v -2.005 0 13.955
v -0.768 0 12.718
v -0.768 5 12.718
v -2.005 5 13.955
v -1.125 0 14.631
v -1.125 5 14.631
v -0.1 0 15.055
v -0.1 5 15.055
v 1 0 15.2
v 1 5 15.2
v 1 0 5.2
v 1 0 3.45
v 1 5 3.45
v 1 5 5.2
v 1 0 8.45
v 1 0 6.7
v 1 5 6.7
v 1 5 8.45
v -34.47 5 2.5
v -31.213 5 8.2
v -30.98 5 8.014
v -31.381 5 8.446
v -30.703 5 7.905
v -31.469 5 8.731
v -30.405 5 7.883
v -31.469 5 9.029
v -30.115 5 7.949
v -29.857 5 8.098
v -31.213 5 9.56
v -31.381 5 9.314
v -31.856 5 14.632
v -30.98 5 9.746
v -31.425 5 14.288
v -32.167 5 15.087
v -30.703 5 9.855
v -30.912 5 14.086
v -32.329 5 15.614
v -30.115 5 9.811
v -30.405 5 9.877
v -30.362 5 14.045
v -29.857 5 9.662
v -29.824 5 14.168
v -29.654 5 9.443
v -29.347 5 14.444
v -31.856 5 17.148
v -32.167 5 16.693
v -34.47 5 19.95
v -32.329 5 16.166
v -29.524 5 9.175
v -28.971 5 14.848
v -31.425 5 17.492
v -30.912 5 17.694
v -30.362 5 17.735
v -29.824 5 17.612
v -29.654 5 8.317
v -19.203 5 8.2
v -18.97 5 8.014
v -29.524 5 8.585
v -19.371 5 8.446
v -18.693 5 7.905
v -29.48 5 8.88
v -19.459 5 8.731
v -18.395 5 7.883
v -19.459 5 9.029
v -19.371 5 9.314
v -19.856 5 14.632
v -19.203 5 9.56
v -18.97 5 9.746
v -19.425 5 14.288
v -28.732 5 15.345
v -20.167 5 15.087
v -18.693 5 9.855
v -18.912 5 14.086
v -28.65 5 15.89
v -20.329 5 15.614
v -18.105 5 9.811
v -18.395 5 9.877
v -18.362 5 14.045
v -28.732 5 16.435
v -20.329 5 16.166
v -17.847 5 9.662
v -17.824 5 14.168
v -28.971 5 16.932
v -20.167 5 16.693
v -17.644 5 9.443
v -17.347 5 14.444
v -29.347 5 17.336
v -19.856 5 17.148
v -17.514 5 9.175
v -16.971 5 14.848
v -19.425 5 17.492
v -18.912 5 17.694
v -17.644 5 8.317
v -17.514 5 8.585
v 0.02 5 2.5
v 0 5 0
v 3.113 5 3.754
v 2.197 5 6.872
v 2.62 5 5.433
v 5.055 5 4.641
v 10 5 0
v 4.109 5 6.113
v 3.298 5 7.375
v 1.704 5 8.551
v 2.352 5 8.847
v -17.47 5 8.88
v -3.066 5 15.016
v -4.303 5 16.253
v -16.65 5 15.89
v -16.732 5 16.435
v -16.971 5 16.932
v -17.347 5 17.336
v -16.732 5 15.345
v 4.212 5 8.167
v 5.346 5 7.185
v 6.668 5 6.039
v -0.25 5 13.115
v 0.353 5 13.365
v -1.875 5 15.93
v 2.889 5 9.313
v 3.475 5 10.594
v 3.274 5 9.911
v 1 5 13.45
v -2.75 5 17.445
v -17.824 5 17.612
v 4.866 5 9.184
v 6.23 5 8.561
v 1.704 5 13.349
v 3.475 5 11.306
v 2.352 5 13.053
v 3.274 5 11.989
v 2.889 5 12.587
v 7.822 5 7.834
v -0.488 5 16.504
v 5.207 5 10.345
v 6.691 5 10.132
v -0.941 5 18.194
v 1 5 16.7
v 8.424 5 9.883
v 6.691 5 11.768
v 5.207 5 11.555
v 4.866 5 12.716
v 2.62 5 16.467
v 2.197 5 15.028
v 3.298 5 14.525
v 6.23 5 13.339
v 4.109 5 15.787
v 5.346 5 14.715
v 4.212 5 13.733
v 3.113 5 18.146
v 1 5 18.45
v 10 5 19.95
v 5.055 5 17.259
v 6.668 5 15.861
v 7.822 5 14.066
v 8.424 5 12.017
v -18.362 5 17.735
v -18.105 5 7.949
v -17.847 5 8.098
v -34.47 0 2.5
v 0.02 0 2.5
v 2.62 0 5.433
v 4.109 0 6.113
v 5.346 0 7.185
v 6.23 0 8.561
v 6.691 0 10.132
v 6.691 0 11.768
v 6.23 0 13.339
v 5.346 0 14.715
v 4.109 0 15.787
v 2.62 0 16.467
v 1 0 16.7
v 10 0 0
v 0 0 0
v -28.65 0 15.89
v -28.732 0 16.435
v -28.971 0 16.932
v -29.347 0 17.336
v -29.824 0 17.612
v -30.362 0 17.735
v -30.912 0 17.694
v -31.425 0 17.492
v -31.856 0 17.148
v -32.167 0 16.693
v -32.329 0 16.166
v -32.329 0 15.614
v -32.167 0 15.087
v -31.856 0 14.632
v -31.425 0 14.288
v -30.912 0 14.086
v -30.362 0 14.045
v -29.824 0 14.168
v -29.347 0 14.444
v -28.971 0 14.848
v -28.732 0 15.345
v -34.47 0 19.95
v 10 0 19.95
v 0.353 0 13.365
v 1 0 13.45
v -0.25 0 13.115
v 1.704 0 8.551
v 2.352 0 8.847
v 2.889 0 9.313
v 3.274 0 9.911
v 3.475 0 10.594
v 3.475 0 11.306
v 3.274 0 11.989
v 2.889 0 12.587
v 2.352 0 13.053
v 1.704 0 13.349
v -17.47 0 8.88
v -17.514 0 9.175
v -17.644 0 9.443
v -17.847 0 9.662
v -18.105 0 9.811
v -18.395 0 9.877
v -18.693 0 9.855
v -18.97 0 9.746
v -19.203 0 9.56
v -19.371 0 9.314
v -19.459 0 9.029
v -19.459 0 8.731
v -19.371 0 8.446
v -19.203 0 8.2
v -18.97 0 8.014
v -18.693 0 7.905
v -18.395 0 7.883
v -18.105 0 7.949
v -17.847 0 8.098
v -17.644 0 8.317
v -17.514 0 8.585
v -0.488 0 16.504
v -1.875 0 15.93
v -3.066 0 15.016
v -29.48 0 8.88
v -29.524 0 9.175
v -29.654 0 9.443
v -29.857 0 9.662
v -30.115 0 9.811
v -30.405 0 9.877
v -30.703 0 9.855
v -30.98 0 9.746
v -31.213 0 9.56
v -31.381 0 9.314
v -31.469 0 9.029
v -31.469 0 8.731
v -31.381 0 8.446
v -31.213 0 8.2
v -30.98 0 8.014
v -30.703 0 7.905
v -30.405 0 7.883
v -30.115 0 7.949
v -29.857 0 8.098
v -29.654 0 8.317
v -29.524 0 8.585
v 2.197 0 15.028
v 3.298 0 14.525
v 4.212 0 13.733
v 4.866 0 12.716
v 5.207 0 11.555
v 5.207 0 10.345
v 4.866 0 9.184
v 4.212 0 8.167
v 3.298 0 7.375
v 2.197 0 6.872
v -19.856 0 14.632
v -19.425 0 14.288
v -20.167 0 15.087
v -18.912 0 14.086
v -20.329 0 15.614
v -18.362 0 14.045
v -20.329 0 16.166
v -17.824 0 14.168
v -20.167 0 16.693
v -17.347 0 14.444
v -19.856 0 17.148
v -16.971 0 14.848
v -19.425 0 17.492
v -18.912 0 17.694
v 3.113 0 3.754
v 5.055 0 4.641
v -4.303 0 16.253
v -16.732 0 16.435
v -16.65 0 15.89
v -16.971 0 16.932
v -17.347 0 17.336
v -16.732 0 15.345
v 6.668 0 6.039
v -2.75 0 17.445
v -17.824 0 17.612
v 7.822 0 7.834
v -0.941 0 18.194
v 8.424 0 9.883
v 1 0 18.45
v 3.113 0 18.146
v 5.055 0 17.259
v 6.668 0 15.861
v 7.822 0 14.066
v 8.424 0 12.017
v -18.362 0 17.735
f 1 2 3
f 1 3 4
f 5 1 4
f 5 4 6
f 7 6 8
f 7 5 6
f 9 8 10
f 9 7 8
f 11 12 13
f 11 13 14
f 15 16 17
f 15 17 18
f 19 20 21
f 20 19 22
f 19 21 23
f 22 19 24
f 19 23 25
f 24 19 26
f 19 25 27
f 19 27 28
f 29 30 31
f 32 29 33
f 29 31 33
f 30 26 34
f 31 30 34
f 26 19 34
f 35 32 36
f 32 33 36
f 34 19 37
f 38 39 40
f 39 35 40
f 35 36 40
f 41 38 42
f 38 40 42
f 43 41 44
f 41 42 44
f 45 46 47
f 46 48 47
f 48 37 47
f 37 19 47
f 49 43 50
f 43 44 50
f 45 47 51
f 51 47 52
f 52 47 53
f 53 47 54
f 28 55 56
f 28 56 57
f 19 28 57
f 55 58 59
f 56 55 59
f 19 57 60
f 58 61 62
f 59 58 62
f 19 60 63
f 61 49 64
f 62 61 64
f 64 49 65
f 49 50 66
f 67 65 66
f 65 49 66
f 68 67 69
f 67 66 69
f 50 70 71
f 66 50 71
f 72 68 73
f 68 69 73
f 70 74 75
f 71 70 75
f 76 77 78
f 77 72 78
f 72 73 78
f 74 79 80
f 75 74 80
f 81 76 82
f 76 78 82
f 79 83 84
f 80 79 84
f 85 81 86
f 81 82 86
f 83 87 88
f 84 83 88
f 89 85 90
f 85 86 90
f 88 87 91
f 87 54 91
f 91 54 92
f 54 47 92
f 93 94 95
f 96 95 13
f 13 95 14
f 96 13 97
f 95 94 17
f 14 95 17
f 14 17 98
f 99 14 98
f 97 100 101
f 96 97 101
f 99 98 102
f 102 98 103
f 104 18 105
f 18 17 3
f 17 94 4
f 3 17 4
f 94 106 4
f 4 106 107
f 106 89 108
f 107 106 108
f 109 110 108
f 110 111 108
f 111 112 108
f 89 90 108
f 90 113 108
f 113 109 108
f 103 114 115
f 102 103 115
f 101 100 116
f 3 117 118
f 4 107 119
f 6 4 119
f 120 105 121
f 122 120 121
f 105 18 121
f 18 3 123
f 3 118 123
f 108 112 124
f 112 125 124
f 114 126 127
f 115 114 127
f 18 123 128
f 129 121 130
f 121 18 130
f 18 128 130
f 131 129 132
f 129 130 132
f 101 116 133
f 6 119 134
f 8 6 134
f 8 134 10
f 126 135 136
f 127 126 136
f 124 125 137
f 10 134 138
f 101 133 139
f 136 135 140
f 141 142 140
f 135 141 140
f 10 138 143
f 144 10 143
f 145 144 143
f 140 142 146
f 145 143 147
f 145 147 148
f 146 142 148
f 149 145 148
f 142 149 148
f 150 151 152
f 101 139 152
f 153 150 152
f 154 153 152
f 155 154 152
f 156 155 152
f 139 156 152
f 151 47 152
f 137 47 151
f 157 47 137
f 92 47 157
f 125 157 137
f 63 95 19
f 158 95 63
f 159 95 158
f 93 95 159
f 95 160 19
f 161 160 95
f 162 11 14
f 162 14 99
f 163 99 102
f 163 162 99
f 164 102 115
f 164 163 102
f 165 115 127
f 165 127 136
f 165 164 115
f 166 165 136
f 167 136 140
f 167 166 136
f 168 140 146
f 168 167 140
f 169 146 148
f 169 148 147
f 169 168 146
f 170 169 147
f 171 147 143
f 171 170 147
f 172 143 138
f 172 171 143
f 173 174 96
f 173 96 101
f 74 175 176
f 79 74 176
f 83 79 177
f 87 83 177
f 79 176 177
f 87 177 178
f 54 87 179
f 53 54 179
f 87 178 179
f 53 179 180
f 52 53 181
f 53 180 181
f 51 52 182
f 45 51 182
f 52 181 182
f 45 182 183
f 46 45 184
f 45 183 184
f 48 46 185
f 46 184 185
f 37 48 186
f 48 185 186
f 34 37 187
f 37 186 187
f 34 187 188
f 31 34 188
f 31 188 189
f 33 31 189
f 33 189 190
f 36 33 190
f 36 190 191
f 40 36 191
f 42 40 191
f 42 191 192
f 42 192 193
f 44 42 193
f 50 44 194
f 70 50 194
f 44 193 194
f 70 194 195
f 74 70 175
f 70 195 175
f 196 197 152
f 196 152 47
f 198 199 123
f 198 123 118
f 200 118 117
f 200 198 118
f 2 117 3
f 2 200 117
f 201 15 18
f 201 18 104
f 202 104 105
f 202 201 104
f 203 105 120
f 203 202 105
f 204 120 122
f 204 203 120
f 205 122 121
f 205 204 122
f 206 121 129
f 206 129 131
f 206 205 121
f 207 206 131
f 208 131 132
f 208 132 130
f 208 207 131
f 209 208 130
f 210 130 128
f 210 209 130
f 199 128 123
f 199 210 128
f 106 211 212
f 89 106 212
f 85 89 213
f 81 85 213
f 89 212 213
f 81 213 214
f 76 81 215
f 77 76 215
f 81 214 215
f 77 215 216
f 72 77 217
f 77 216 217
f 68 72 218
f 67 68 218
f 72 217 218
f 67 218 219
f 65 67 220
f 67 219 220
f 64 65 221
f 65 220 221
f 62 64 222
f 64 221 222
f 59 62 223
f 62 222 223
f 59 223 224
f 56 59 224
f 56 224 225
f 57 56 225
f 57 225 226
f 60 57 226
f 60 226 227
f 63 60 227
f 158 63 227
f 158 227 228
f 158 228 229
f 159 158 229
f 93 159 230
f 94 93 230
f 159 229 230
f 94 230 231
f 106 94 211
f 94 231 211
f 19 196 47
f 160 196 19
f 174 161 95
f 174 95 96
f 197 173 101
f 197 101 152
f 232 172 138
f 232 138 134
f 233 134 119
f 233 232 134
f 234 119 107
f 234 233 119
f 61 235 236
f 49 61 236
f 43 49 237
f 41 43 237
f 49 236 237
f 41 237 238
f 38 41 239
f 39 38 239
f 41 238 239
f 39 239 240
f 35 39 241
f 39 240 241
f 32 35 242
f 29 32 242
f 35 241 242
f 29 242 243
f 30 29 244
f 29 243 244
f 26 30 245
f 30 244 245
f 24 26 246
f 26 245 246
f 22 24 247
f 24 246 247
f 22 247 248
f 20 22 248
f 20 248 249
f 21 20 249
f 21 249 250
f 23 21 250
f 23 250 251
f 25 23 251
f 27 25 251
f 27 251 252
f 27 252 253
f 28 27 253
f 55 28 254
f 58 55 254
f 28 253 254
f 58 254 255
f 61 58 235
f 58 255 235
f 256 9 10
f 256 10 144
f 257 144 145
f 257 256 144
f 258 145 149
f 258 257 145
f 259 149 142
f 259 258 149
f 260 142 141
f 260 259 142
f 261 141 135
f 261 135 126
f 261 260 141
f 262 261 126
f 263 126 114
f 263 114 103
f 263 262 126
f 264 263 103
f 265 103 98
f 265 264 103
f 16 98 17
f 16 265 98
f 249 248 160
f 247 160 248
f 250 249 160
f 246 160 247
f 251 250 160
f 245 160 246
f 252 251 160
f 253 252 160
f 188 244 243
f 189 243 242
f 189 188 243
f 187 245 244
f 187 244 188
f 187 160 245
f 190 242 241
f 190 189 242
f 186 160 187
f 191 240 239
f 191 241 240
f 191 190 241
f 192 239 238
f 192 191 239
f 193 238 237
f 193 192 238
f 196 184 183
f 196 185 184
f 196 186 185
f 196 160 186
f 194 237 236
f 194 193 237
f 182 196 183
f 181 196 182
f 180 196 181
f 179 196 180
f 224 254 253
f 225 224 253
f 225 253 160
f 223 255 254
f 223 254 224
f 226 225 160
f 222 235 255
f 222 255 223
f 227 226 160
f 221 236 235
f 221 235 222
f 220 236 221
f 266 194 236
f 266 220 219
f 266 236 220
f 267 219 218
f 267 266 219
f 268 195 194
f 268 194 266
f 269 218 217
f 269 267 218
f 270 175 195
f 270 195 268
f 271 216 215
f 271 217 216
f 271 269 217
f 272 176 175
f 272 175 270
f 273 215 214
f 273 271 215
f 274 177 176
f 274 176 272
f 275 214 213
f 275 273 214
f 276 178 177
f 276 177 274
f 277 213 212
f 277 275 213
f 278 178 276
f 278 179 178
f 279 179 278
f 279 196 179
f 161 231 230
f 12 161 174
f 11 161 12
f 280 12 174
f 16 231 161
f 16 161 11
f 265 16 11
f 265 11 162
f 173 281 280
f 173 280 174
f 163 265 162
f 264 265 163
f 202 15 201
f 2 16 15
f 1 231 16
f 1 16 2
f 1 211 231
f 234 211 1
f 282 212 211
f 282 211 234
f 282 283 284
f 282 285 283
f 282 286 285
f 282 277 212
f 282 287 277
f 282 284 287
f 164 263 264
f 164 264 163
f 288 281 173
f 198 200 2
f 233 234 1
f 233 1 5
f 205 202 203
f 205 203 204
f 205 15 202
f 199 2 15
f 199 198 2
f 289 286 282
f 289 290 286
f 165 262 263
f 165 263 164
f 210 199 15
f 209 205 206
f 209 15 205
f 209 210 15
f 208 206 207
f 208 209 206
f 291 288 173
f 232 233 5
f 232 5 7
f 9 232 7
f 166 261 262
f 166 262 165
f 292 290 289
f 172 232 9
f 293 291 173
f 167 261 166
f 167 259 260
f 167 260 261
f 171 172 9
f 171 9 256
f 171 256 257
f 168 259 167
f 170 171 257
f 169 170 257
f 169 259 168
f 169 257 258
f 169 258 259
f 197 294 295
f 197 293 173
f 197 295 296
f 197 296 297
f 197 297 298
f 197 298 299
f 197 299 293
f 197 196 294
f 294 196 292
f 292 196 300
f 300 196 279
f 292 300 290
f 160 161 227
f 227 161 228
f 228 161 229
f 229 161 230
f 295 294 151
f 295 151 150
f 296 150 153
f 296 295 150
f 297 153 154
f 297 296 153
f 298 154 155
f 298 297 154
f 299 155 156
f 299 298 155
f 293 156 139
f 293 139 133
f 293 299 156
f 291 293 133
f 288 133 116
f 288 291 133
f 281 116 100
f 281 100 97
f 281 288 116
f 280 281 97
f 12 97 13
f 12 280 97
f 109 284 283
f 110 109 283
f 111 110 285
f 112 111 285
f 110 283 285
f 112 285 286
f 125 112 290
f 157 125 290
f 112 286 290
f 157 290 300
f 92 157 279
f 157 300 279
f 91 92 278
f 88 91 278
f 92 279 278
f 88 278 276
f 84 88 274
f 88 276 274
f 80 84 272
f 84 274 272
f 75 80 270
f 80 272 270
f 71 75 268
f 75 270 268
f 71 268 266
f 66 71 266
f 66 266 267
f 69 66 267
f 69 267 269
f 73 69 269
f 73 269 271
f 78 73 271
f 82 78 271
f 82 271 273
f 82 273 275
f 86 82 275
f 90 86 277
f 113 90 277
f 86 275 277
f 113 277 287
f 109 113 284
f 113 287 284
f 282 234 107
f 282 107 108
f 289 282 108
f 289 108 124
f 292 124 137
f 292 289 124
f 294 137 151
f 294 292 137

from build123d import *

# Parameters (mm, degrees)
F0_R     = 1
F0_R_2   = 1.85
F1_DEPTH = 5


with BuildPart() as f1:
    # F0 (on Front) → F1 (new body)
    with BuildSketch(Plane.XZ):
        Polygon((10, 0), (10, 19.95), (1, 19.95), (-34.47, 19.95), (-34.47, 2.5), (-30.48, 2.5), (0.02, 2.5), (0, 0), align=None)
        with Locations((-30.48, 8.88)):
            Circle(F0_R, mode=Mode.SUBTRACT)
        with Locations((-18.47, 8.88)):
            Circle(F0_R, mode=Mode.SUBTRACT)
        with Locations((-30.5, 15.89)):
            Circle(F0_R_2, mode=Mode.SUBTRACT)
        with Locations((-18.5, 15.89)):
            Circle(F0_R_2, mode=Mode.SUBTRACT)
        with BuildLine():
            ThreePointArc((-2.005204, 13.955204), (-0.626405, 14.876488), (1, 15.2))
            ThreePointArc((1, 15.2), (5.25, 10.95), (1, 6.7))
            Line((1, 6.7), (1, 8.45))
            ThreePointArc((1, 8.45), (3.5, 10.95), (1, 13.45))
            ThreePointArc((1, 13.45), (0.043291, 13.259699), (-0.767767, 12.717767))
            Line((-0.767767, 12.717767), (-2.005204, 13.955204))
        make_face(mode=Mode.SUBTRACT)
        with BuildLine():
            ThreePointArc((-4.303301, 16.253301), (-1.870126, 17.879096), (1, 18.45))
            ThreePointArc((1, 18.45), (8.5, 10.95), (1, 3.45))
            Line((1, 3.45), (1, 5.2))
            ThreePointArc((1, 5.2), (6.75, 10.95), (1, 16.7))
            ThreePointArc((1, 16.7), (-1.20043, 16.262307), (-3.065864, 15.015864))
            Line((-3.065864, 15.015864), (-4.303301, 16.253301))
        make_face(mode=Mode.SUBTRACT)
    extrude(amount=-F1_DEPTH)


solid = f1.part
